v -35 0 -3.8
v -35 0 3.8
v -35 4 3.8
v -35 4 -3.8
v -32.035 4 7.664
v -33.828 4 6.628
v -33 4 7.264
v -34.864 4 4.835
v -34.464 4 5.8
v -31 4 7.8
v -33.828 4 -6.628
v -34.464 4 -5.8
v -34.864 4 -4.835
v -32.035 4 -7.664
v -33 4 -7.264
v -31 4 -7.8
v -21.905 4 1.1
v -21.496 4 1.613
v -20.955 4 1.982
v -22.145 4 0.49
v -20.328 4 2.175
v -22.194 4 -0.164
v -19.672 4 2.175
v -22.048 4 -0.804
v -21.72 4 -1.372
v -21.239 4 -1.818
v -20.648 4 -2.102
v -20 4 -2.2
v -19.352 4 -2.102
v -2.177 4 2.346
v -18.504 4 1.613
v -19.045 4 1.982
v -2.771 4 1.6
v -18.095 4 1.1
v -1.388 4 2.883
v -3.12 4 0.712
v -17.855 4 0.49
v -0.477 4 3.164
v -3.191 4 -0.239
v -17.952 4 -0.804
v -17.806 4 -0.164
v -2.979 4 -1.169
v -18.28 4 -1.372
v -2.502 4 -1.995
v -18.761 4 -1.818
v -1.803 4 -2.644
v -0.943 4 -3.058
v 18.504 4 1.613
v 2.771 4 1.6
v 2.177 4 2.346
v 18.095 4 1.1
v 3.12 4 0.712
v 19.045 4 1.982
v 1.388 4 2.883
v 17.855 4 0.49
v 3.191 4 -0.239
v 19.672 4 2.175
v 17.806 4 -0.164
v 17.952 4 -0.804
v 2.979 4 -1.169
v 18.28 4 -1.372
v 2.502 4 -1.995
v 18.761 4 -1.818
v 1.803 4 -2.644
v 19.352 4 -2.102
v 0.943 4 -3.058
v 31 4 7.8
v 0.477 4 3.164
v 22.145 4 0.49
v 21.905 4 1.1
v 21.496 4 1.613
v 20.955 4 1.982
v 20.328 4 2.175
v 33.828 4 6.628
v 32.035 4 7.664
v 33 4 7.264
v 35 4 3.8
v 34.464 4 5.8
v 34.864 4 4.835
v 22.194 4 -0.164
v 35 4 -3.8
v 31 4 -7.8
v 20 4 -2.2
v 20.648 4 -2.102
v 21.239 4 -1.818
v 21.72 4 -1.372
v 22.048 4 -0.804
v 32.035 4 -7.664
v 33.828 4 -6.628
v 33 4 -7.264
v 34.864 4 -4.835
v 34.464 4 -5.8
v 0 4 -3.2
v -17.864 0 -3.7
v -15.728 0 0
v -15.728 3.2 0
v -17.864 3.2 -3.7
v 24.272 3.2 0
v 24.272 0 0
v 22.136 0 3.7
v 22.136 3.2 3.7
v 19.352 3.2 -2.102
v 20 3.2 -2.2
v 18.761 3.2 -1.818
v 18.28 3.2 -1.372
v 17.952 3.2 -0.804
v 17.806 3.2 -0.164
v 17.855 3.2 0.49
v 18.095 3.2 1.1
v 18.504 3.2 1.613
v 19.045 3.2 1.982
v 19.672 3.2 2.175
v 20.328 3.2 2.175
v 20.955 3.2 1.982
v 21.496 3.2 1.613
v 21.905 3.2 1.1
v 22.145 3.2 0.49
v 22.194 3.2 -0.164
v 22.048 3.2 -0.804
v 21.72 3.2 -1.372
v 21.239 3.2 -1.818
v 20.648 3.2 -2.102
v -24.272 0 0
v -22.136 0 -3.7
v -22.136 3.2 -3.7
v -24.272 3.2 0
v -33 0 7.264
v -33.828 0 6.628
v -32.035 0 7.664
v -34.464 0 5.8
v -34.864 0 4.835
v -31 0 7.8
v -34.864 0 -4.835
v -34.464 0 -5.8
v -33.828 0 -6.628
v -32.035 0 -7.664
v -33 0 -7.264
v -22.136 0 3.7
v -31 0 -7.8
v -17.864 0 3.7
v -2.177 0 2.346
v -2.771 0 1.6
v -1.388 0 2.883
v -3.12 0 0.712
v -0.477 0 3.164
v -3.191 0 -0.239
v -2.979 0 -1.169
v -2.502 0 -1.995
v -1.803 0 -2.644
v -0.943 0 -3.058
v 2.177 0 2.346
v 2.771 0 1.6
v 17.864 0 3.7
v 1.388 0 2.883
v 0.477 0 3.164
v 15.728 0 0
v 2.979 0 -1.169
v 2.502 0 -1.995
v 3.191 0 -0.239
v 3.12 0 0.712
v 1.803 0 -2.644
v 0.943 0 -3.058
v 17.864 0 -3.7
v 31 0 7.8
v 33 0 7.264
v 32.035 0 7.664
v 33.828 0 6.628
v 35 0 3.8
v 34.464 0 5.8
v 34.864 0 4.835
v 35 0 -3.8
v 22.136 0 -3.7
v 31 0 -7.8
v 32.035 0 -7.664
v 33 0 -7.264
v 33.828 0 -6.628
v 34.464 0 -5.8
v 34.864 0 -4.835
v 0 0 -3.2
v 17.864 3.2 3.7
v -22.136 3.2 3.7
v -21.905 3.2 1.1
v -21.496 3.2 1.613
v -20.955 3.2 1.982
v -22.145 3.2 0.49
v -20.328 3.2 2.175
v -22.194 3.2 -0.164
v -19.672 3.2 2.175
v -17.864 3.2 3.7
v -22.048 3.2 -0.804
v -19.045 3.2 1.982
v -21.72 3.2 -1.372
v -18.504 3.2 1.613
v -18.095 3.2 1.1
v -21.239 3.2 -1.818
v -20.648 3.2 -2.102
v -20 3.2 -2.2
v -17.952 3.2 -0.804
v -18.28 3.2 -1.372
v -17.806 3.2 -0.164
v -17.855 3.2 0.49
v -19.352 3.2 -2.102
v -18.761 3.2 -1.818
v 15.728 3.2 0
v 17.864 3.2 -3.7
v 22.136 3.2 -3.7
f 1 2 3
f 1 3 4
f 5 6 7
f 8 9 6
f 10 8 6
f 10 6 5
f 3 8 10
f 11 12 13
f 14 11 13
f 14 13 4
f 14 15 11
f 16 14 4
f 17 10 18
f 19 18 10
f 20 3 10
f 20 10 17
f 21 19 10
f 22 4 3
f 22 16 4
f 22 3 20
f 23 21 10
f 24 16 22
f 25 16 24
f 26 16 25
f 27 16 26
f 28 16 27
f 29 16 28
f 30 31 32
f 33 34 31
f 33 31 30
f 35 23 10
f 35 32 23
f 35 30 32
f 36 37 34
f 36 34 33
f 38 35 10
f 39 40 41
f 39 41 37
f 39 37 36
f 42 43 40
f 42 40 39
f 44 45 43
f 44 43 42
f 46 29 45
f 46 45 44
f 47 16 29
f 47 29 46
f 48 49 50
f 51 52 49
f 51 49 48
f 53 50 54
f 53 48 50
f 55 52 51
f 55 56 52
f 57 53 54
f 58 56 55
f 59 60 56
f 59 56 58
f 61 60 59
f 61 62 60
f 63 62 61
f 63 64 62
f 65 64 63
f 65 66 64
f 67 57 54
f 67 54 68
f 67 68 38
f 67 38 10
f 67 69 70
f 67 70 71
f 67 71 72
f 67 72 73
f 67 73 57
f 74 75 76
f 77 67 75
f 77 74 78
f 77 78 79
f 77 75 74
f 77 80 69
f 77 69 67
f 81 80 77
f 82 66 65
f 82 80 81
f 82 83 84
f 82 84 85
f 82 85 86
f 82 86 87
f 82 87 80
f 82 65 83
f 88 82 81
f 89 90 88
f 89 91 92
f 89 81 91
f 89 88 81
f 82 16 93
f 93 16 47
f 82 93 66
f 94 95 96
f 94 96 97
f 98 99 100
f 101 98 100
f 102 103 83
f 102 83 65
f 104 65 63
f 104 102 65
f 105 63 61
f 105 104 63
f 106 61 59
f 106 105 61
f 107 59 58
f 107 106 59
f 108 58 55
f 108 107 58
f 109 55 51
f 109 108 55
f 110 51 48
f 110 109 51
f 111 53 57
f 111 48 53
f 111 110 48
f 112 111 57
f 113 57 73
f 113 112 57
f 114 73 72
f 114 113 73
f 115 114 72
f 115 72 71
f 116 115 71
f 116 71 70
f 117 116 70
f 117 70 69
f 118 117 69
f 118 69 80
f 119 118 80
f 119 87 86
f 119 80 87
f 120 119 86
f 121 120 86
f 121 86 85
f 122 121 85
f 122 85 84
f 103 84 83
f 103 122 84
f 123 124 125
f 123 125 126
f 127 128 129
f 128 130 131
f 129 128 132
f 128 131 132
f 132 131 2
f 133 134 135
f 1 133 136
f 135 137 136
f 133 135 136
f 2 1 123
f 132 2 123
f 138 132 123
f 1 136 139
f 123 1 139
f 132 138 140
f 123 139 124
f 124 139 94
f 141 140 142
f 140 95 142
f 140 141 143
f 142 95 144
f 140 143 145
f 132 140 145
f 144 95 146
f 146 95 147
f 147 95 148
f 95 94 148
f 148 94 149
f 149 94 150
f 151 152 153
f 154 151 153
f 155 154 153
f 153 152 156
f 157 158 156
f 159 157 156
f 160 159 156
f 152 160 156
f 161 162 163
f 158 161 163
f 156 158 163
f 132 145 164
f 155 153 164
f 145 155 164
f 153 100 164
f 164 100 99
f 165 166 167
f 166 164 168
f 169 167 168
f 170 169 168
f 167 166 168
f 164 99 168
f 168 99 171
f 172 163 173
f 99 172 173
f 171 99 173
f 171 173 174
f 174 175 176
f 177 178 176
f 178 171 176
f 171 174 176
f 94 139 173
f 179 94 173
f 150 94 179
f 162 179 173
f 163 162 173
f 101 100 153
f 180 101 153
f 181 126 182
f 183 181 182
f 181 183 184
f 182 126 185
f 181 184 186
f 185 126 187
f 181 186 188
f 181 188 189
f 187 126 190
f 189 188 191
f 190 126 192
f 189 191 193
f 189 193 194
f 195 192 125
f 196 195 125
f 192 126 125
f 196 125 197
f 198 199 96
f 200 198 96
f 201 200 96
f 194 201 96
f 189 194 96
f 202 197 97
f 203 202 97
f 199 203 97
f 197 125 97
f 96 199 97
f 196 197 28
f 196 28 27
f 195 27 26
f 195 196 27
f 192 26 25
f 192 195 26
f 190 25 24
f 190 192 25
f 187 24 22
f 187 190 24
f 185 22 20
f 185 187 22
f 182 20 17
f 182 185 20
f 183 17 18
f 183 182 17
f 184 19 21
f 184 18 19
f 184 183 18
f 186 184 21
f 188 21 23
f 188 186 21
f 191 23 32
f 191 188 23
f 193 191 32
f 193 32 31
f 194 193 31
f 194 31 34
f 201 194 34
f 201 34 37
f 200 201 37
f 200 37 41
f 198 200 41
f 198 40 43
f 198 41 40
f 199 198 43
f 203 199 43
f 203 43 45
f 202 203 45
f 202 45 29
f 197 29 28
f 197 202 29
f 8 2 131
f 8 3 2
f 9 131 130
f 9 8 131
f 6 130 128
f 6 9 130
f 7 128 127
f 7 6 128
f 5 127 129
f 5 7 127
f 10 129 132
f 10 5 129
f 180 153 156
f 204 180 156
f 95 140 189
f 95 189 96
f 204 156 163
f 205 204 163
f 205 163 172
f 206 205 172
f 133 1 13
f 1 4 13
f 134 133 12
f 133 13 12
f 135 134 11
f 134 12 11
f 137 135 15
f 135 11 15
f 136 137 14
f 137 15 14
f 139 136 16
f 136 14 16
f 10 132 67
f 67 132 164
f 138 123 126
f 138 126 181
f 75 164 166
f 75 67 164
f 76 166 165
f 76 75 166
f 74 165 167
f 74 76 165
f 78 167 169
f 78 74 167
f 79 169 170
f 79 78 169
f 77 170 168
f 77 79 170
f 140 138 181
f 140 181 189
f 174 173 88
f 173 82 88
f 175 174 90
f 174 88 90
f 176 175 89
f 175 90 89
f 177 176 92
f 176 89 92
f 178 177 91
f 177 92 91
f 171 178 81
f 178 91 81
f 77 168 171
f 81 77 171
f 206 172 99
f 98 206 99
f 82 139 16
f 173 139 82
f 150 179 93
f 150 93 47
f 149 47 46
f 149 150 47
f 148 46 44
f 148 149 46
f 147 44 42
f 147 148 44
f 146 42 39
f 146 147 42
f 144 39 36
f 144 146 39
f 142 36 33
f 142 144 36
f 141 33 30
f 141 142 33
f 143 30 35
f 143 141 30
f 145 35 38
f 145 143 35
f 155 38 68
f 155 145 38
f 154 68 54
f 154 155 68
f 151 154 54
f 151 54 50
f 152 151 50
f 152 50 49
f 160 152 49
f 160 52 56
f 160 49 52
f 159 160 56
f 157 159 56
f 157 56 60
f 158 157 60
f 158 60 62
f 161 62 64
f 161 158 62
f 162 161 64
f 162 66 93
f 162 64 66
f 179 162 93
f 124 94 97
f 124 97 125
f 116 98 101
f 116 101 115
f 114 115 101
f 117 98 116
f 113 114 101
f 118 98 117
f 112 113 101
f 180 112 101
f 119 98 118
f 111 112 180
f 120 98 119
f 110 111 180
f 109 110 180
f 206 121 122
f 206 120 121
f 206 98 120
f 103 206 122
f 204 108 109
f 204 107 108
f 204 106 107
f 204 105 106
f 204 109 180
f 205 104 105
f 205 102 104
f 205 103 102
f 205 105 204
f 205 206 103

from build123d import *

# Parameters (mm, degrees)
CROQUIS1_W                 = 70
CROQUIS1_H                 = 15.6
SALIENTE_EXTRUIR1_DEPTH    = 4
CORTAR_EXTRUIR2_DEPTH      = 37.081019941
CORTAR_EXTRUIR2_DEPTH_BACK = 37.081019941
CROQUIS3_R                 = 3.2
CROQUIS3_R_2               = 2.2
REDONDEO1_R                = 4
CORTAR_EXTRUIR4_DEPTH      = 3.2


with BuildPart() as part:
    # Croquis1 → Saliente-Extruir1 (new body)
    with BuildSketch(Plane(origin=(0, 0, 0), x_dir=(1, 0, 0), z_dir=(0, 1, 0))):
        Rectangle(CROQUIS1_W, CROQUIS1_H)
    extrude(amount=SALIENTE_EXTRUIR1_DEPTH)

    # Croquis3 → Cortar-Extruir2 (cut, two sides: drawn at the far end of the back side and taken through both)
    with BuildSketch(Plane(origin=(0, 0, 0), x_dir=(1, 0, 0), z_dir=(0, 1, 0)).offset(-CORTAR_EXTRUIR2_DEPTH_BACK)):
        with Locations(Location((0, 0, 0), (0, 0, 90))):
            Circle(CROQUIS3_R)
        with Locations(Location((20, 0, 0), (0, 0, 90))):
            Circle(CROQUIS3_R_2)
        with Locations(Location((-20, 0, 0), (0, 0, 90))):
            Circle(CROQUIS3_R_2)
    extrude(amount=CORTAR_EXTRUIR2_DEPTH + CORTAR_EXTRUIR2_DEPTH_BACK, mode=Mode.SUBTRACT)

    # Redondeo1
    redondeo1_edges = [part.edges().sort_by_distance(p)[0] for p in [
        (35, 2, 7.8),
        (-35, 2, 7.8),
        (-35, 2, -7.8),
        (35, 2, -7.8),
    ]]
    fillet(redondeo1_edges, radius=REDONDEO1_R)

    # Croquis5 → Cortar-Extruir4 (cut)
    with BuildSketch(Plane(origin=(0, 0, 0), x_dir=(1, 0, 0), z_dir=(0, 1, 0))):
        Polygon((-15.727608008, 0), (-17.863804004, 3.7), (-22.136195996, 3.7), (-24.272391992, 0), (-22.136195996, -3.7), (-17.863804004, -3.7), align=None)
        Polygon((17.863804004, -3.7), (15.727608008, 0), (17.863804004, 3.7), (22.136195996, 3.7), (24.272391992, 0), (22.136195996, -3.7), align=None)
    extrude(amount=CORTAR_EXTRUIR4_DEPTH, mode=Mode.SUBTRACT)


solid = part.part
